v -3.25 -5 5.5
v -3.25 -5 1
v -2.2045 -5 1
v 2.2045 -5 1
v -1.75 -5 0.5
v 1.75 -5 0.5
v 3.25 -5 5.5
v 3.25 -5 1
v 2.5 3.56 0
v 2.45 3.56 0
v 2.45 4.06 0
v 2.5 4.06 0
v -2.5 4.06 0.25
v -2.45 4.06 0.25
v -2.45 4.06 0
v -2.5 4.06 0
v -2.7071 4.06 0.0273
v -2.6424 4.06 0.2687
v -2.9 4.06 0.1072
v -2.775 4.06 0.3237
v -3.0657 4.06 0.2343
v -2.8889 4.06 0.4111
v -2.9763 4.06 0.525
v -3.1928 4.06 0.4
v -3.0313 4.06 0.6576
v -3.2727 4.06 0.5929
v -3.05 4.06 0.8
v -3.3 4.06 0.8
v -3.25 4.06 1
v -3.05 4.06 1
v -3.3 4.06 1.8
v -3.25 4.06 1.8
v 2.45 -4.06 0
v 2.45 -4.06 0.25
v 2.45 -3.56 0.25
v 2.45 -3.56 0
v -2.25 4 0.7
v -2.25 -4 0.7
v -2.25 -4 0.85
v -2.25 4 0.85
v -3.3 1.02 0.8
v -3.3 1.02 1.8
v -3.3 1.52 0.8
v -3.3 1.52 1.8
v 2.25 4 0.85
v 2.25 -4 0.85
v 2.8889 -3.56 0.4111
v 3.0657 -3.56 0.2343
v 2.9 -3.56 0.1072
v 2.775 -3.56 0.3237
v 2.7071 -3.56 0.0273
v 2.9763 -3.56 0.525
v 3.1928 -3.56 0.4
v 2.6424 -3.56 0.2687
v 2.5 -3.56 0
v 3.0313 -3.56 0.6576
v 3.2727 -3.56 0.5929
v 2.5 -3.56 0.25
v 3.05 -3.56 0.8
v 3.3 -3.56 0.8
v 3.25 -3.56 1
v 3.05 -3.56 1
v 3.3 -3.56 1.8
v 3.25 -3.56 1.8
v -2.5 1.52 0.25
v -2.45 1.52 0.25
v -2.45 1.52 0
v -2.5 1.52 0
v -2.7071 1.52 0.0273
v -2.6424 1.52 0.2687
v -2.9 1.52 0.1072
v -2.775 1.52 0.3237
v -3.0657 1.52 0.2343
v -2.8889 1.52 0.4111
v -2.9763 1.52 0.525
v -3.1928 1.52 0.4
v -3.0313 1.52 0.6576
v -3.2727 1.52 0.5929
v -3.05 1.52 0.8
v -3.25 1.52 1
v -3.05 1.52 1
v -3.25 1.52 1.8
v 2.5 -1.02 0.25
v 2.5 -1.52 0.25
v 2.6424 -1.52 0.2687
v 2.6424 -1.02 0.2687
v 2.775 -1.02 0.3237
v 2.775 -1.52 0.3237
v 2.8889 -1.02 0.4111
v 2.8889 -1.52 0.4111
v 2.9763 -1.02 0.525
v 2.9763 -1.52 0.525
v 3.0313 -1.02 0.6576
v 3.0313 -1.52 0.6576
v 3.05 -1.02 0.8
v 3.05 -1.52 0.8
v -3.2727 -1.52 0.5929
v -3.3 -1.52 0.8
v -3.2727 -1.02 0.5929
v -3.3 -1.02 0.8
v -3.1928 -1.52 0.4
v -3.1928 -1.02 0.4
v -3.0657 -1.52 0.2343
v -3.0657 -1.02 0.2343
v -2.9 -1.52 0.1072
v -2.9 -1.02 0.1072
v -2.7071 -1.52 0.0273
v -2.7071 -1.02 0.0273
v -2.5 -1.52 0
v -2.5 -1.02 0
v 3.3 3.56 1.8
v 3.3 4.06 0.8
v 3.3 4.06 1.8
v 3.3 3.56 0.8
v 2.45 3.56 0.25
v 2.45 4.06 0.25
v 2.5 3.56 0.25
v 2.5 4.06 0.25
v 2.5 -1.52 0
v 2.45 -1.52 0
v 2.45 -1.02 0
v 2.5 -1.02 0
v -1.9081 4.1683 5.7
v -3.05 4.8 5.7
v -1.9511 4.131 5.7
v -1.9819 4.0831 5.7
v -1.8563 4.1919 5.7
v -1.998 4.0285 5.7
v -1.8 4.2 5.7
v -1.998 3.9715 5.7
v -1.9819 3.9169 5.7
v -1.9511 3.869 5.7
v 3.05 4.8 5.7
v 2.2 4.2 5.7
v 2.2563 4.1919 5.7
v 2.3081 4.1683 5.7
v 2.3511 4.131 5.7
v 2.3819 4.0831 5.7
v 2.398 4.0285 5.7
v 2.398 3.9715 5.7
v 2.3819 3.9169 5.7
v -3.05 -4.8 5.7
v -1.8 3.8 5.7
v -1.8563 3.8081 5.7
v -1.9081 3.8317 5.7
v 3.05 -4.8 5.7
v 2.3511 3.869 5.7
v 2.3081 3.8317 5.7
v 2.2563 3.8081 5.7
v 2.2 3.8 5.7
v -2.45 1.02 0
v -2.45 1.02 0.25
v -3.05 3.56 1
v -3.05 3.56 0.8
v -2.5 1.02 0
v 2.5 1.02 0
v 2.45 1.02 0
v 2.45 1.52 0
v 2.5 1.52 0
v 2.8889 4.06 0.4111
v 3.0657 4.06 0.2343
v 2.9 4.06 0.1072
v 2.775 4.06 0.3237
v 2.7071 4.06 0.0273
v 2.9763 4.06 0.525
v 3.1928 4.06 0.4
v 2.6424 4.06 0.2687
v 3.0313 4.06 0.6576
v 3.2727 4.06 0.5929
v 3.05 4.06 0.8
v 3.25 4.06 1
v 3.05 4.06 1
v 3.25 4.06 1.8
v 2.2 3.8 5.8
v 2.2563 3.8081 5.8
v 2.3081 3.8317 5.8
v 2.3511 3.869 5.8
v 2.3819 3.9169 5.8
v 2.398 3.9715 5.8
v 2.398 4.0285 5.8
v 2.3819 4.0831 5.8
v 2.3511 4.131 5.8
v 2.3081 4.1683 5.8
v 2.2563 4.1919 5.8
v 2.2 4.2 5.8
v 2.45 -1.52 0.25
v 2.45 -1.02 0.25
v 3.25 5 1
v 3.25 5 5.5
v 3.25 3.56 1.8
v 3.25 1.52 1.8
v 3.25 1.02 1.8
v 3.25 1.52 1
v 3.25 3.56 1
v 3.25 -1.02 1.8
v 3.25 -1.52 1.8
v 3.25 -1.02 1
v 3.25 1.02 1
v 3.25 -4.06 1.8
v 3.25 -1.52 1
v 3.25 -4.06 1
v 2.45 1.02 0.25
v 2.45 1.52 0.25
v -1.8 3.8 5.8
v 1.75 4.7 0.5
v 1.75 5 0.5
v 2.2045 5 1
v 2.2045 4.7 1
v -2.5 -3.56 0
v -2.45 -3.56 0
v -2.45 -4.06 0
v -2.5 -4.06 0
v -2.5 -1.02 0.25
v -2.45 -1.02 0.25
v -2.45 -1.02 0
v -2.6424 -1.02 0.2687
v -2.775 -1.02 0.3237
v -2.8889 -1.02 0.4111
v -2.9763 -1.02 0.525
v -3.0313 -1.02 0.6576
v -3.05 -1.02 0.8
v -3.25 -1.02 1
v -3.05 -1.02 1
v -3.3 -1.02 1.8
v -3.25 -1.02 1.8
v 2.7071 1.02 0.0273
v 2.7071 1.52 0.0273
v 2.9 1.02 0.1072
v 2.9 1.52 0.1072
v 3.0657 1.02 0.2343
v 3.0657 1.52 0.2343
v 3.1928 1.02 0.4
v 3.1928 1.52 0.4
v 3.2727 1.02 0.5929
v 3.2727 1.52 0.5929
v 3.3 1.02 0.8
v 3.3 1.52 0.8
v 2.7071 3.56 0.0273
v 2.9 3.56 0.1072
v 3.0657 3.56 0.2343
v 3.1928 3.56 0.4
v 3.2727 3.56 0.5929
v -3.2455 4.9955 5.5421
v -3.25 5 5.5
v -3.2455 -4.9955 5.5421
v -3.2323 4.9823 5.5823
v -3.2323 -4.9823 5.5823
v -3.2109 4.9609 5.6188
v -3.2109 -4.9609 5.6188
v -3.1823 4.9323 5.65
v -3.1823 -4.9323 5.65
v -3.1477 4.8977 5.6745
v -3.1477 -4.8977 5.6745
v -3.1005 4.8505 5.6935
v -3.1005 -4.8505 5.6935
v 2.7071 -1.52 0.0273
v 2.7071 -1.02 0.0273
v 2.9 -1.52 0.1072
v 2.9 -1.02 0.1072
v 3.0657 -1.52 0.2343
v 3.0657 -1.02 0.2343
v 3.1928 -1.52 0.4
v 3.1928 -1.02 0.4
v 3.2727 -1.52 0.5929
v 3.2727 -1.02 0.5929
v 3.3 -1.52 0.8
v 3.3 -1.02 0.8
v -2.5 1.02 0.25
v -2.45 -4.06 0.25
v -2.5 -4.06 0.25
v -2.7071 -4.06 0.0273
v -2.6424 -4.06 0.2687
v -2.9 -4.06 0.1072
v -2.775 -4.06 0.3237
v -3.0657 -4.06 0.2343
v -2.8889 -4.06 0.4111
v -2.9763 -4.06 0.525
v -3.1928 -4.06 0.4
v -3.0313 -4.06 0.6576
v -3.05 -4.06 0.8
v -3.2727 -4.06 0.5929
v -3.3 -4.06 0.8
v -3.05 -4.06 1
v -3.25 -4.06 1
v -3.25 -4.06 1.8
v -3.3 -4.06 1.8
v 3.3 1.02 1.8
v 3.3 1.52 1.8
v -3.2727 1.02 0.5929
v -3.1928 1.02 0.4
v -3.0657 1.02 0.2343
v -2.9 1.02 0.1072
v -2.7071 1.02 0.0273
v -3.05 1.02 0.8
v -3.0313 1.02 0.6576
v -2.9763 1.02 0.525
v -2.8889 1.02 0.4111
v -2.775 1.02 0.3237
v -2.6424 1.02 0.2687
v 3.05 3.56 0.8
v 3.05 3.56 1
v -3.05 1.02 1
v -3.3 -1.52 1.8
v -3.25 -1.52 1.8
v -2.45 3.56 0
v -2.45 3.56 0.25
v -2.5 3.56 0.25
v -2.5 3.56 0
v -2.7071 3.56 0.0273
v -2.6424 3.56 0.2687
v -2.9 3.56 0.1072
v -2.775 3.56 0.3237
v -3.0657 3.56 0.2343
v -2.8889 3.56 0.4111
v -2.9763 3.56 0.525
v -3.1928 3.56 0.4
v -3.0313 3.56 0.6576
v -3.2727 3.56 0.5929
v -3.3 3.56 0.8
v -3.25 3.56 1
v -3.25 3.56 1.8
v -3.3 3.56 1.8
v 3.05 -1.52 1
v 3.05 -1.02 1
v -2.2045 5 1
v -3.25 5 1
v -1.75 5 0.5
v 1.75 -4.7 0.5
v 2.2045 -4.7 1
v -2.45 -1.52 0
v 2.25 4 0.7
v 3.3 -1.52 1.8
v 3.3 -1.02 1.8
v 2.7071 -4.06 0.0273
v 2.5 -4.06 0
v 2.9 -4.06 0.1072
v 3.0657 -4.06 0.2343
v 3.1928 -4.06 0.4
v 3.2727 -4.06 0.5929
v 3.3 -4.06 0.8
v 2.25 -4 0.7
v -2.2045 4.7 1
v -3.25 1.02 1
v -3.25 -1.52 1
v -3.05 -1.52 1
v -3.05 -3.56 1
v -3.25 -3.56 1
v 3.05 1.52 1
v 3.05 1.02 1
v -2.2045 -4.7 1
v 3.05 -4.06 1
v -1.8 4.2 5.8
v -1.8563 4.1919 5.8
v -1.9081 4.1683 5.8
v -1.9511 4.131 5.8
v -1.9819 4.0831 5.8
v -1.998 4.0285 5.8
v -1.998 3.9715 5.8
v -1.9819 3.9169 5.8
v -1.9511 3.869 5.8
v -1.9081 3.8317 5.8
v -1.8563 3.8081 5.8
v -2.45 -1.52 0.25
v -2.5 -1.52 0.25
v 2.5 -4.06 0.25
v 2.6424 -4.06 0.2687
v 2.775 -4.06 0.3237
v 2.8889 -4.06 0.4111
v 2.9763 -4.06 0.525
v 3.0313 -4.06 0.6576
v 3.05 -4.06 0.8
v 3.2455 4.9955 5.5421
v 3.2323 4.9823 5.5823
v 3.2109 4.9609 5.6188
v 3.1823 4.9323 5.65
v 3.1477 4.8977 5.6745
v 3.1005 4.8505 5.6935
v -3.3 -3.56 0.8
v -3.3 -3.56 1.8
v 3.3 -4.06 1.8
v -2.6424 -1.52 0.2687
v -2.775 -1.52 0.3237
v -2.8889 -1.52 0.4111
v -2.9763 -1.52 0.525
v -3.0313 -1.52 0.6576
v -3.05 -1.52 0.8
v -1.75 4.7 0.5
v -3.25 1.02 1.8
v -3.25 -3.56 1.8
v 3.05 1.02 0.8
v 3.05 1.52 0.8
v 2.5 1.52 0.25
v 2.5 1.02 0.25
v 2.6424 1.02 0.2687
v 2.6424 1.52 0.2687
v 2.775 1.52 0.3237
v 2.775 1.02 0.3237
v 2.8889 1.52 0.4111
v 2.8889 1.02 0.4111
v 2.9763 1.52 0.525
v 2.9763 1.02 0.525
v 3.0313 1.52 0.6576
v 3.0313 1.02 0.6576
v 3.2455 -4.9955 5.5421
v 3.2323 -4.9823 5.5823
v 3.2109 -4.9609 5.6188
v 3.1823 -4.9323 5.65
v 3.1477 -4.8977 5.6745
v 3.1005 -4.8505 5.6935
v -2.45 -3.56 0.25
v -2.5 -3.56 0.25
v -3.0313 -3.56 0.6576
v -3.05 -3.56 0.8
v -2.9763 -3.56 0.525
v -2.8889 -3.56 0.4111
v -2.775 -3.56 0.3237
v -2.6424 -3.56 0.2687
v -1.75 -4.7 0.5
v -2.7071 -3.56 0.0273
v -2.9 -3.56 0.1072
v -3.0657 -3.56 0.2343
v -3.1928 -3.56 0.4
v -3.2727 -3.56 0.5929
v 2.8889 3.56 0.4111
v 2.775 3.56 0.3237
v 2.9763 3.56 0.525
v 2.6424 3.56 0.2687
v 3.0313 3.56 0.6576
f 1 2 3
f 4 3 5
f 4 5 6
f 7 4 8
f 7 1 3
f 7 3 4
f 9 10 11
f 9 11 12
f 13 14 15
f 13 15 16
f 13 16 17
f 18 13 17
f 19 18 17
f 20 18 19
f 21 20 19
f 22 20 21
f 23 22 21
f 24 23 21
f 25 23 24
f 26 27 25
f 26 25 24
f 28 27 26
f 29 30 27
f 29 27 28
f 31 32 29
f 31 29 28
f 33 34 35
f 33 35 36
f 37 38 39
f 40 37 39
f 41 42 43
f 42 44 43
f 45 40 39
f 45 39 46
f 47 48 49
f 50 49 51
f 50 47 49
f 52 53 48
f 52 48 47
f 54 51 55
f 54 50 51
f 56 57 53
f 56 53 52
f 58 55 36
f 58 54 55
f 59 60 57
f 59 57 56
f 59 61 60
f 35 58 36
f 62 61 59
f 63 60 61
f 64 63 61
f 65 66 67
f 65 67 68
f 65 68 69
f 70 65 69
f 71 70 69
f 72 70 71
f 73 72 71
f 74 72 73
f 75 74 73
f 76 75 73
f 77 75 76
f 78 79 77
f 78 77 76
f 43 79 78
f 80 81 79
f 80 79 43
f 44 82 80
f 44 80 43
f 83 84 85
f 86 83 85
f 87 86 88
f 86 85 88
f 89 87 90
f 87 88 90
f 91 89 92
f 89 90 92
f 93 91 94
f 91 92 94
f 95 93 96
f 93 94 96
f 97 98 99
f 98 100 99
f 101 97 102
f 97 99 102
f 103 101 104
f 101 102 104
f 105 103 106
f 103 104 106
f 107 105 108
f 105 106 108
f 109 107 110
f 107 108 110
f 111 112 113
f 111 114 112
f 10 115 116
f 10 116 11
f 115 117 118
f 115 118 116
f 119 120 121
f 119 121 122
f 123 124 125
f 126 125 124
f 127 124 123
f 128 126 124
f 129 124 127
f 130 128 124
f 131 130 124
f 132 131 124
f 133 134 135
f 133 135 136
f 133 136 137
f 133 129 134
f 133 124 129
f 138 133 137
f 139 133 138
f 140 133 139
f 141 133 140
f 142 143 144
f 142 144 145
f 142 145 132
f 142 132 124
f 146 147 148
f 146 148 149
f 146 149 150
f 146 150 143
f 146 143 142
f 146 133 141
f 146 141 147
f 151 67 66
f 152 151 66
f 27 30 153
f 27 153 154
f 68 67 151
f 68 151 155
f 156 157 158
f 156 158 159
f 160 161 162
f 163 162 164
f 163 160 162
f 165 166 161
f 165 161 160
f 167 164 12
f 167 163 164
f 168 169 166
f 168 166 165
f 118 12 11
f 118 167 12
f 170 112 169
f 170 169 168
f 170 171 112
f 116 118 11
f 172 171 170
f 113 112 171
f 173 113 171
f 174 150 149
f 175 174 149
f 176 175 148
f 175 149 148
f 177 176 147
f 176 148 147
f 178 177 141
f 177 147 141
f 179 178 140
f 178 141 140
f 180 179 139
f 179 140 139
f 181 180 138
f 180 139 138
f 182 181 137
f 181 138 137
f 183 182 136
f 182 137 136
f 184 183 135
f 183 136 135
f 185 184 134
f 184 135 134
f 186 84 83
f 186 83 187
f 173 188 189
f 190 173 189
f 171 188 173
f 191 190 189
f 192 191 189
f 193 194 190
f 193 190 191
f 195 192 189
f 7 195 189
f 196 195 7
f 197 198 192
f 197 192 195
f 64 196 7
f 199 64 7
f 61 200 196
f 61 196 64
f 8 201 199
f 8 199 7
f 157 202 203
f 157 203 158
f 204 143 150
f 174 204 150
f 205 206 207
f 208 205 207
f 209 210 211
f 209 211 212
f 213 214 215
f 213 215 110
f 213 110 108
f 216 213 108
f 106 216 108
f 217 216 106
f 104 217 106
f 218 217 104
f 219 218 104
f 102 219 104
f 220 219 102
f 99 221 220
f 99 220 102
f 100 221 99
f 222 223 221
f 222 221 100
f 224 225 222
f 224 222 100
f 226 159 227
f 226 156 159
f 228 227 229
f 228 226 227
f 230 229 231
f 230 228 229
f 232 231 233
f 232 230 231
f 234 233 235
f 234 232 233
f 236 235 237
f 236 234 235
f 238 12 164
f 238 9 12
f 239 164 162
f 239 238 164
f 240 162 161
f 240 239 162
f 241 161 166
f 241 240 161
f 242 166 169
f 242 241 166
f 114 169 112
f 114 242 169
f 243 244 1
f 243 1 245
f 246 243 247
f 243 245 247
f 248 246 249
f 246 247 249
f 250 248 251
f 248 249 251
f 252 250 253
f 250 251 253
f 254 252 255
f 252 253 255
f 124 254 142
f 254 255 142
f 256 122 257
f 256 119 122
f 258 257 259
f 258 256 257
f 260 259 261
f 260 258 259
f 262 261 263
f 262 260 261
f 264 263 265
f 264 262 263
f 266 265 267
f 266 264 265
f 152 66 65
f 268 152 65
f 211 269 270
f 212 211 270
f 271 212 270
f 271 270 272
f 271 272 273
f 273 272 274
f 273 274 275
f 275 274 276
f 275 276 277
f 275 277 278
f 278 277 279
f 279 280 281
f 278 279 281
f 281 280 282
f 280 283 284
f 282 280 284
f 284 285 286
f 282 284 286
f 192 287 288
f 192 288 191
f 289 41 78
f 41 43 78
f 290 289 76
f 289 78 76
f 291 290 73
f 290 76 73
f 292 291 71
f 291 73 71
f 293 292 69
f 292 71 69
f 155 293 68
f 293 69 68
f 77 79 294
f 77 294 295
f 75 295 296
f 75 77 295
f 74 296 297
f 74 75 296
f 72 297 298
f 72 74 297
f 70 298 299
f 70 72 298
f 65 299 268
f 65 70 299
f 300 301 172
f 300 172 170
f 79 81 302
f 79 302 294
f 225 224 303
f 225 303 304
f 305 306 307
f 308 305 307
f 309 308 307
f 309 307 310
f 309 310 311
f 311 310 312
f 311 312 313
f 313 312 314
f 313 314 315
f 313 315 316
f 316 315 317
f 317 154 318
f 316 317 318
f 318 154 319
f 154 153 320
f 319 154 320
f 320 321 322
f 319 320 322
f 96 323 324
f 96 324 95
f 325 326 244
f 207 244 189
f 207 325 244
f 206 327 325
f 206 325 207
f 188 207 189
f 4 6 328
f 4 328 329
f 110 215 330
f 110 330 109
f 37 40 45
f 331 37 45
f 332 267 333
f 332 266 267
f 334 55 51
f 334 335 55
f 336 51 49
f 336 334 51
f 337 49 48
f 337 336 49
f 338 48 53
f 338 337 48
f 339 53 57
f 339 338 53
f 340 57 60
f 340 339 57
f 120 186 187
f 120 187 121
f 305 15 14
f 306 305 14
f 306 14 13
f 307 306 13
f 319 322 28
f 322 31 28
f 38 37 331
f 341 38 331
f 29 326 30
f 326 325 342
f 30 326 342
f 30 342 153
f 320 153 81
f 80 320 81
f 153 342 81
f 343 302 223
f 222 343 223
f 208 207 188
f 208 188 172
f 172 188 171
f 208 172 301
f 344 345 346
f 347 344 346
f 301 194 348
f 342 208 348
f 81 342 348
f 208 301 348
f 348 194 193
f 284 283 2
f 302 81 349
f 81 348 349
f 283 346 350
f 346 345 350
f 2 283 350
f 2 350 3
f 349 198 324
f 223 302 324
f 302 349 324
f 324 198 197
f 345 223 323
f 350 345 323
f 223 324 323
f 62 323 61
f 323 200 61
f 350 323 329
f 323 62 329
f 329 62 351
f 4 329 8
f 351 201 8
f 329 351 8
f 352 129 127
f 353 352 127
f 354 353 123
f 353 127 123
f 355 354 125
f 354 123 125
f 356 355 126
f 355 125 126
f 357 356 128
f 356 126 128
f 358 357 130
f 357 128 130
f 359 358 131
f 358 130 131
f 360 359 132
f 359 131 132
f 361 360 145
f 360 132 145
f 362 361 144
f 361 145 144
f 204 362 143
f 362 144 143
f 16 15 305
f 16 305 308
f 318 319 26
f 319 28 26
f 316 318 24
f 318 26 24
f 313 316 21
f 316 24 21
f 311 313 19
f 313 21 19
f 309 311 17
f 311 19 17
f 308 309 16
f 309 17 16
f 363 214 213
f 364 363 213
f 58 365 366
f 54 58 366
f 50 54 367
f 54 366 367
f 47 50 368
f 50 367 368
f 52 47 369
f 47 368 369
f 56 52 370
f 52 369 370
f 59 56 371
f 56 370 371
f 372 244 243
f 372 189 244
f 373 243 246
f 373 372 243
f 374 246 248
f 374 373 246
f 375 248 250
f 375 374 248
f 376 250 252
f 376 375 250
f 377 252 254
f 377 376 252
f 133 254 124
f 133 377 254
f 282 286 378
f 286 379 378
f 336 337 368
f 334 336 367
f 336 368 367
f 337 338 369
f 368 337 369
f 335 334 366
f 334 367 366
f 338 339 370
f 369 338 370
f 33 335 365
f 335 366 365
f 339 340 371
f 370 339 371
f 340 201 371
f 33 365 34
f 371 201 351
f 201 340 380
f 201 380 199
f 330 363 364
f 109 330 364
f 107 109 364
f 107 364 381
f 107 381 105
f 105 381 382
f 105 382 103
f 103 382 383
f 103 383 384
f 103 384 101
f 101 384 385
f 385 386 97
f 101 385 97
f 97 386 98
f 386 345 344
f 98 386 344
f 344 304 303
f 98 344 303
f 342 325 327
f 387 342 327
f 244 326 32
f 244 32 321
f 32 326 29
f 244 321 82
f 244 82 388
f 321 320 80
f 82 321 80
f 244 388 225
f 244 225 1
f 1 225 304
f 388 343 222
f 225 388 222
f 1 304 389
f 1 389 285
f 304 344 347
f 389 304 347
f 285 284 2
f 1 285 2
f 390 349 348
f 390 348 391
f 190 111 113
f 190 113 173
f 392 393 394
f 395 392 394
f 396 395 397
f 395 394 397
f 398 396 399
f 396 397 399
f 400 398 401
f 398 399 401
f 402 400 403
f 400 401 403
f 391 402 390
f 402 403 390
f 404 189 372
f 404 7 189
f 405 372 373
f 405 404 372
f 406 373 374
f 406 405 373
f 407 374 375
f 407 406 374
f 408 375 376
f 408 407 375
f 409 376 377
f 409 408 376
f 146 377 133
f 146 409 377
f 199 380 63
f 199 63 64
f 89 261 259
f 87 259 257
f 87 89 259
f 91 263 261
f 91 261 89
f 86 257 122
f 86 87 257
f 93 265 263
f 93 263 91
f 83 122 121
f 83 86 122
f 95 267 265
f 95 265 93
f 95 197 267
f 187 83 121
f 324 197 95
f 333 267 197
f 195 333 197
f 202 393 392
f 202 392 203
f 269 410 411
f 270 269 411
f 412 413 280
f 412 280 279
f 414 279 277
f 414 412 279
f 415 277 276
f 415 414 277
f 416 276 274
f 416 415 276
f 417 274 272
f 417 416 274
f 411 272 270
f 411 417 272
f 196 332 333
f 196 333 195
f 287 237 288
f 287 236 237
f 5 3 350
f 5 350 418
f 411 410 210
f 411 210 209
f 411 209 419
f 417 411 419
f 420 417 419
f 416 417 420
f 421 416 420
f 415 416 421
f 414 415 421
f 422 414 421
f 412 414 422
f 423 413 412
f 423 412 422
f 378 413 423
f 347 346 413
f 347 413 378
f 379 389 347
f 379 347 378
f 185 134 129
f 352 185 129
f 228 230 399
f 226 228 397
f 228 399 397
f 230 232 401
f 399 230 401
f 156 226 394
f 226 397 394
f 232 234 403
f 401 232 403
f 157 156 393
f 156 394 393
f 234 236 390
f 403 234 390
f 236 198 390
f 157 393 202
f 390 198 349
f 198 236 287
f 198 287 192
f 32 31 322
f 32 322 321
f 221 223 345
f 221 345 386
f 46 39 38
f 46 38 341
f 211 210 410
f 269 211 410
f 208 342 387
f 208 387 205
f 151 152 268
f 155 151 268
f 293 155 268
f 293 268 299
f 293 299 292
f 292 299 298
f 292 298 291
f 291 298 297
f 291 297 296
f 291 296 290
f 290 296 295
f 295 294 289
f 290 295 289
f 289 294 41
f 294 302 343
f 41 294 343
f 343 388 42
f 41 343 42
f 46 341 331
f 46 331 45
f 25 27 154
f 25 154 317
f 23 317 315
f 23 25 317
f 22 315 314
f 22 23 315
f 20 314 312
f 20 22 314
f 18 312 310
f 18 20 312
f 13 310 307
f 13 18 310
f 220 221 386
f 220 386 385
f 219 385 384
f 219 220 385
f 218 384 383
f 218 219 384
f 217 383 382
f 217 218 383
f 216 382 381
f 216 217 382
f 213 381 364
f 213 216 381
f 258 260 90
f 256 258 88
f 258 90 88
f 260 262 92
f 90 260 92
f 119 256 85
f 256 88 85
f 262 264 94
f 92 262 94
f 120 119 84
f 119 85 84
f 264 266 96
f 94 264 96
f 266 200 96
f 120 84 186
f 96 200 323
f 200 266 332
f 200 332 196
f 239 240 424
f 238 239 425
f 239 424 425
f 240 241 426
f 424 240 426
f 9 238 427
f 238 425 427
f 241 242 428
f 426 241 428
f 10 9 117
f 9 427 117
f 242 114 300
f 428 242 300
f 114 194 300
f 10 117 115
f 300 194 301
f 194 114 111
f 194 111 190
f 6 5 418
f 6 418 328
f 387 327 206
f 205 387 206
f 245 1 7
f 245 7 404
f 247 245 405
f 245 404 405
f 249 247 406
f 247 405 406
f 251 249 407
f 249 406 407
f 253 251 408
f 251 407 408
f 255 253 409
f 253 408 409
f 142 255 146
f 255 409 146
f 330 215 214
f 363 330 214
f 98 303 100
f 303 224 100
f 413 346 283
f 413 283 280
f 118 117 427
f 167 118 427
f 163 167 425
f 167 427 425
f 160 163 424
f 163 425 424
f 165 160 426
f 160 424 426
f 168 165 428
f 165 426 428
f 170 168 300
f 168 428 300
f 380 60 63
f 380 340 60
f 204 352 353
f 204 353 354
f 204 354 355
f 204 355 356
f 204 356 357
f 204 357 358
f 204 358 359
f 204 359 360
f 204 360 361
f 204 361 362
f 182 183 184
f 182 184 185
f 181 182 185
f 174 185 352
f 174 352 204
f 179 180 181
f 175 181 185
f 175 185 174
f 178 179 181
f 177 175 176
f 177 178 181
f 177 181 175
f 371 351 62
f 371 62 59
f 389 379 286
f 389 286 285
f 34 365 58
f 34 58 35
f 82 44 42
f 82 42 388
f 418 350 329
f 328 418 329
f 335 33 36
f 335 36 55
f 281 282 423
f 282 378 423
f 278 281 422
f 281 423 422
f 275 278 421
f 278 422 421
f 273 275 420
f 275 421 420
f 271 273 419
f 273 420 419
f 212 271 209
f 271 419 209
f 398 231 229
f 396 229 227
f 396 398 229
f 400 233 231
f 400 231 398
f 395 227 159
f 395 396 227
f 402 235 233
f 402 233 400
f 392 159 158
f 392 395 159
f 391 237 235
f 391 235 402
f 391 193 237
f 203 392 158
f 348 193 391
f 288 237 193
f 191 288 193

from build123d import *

# Parameters (mm, degrees)
SKETCH_W     = 10
SKETCH_H     = 6.5
PAD_DEPTH    = 4.7
FILLET_R     = 0.2
PAD010_DEPTH = 0.25
PAD012_DEPTH = 0.25
PAD007_DEPTH = 0.3
SKETCH008_W  = 4.5
SKETCH008_H  = 0.15
PAD006_DEPTH = 4
PAD013_DEPTH = 0.25
PAD011_DEPTH = 0.25
PAD014_DEPTH = 0.2
PAD008_DEPTH = 0.3


with BuildPart() as fillet_body:
    # Sketch → Pad (new body)
    with BuildSketch(Plane(origin=(0, 0, 1), x_dir=(0, -1, 0), z_dir=(0, 0, 1))):
        Rectangle(SKETCH_W, SKETCH_H)
    extrude(amount=PAD_DEPTH)

    # Fillet
    fillet_edges = [fillet_body.edges().sort_by_distance(p)[0] for p in [
        (-3.25, 0, 5.7),
        (0, -5, 5.7),
        (3.25, 0, 5.7),
        (0, 5, 5.7),
    ]]
    fillet(fillet_edges, radius=FILLET_R)


with BuildPart() as pad010:
    # Sketch011 → Pad010 (new body, symmetric)
    with BuildSketch(Plane.XZ.offset(1.27)):
        with BuildLine():
            Line((-3.3, 1.8), (-3.05, 1.8))
            Line((-3.05, 1.8), (-3.05, 0.8))
            ThreePointArc((-3.05, 0.8), (-2.888909, 0.411091), (-2.5, 0.25))
            Line((-2.45, 0.25), (-2.5, 0.25))
            Line((-2.45, 0), (-2.45, 0.25))
            Line((-2.45, 0), (-2.5, 0))
            ThreePointArc((-3.3, 0.8), (-3.065685, 0.234315), (-2.5, 0))
            Line((-3.3, 1.8), (-3.3, 0.8))
        make_face()
        with BuildLine():
            ThreePointArc((2.5, 0.25), (2.888909, 0.411091), (3.05, 0.8))
            Line((3.05, 1.8), (3.05, 0.8))
            Line((3.3, 1.8), (3.05, 1.8))
            Line((3.3, 0.8), (3.3, 1.8))
            ThreePointArc((2.500011, 0), (3.065689, 0.234318), (3.3, 0.8))
            Line((2.45, 0), (2.500011, 0))
            Line((2.45, 0.25), (2.45, 0))
            Line((2.5, 0.25), (2.45, 0.25))
        make_face()
    extrude(amount=PAD010_DEPTH, both=True)


with BuildPart() as pad012:
    # Sketch013 → Pad012 (new body, symmetric)
    with BuildSketch(Plane.XZ.offset(-3.81)):
        with BuildLine():
            Line((-3.3, 1.8), (-3.05, 1.8))
            Line((-3.05, 1.8), (-3.05, 0.8))
            ThreePointArc((-3.05, 0.8), (-2.888909, 0.411091), (-2.5, 0.25))
            Line((-2.45, 0.25), (-2.5, 0.25))
            Line((-2.45, 0), (-2.45, 0.25))
            Line((-2.45, 0), (-2.5, 0))
            ThreePointArc((-3.3, 0.8), (-3.065685, 0.234315), (-2.5, 0))
            Line((-3.3, 1.8), (-3.3, 0.8))
        make_face()
        with BuildLine():
            ThreePointArc((2.5, 0.25), (2.888909, 0.411091), (3.05, 0.8))
            Line((3.05, 1.8), (3.05, 0.8))
            Line((3.3, 1.8), (3.05, 1.8))
            Line((3.3, 0.8), (3.3, 1.8))
            ThreePointArc((2.500011, 0), (3.065689, 0.234318), (3.3, 0.8))
            Line((2.45, 0), (2.500011, 0))
            Line((2.45, 0.25), (2.45, 0))
            Line((2.5, 0.25), (2.45, 0.25))
        make_face()
    extrude(amount=PAD012_DEPTH, both=True)


with BuildPart() as pad007:
    # Sketch009 → Pad007 (new body)
    with BuildSketch(Plane.XZ.offset(5)):
        Polygon((-1.75, 0.5), (1.75, 0.5), (2.25, 1.05), (-2.25, 1.05), align=None)
    extrude(amount=-PAD007_DEPTH)


with BuildPart() as pad006:
    # Sketch008 → Pad006 (new body, symmetric)
    with BuildSketch(Plane.XZ):
        with Locations((0, 0.775)):
            Rectangle(SKETCH008_W, SKETCH008_H)
    extrude(amount=PAD006_DEPTH, both=True)


with BuildPart() as pad013:
    # Sketch014 → Pad013 (new body, symmetric)
    with BuildSketch(Plane.XZ.offset(3.81)):
        with BuildLine():
            Line((-3.3, 1.8), (-3.05, 1.8))
            Line((-3.05, 1.8), (-3.05, 0.8))
            ThreePointArc((-3.05, 0.8), (-2.888909, 0.411091), (-2.5, 0.25))
            Line((-2.45, 0.25), (-2.5, 0.25))
            Line((-2.45, 0), (-2.45, 0.25))
            Line((-2.45, 0), (-2.5, 0))
            ThreePointArc((-3.3, 0.8), (-3.065685, 0.234315), (-2.5, 0))
            Line((-3.3, 1.8), (-3.3, 0.8))
        make_face()
        with BuildLine():
            ThreePointArc((2.5, 0.25), (2.888909, 0.411091), (3.05, 0.8))
            Line((3.05, 1.8), (3.05, 0.8))
            Line((3.3, 1.8), (3.05, 1.8))
            Line((3.3, 0.8), (3.3, 1.8))
            ThreePointArc((2.500011, 0), (3.065689, 0.234318), (3.3, 0.8))
            Line((2.45, 0), (2.500011, 0))
            Line((2.45, 0.25), (2.45, 0))
            Line((2.5, 0.25), (2.45, 0.25))
        make_face()
    extrude(amount=PAD013_DEPTH, both=True)


with BuildPart() as pad011:
    # Sketch012 → Pad011 (new body, symmetric)
    with BuildSketch(Plane.XZ.offset(-1.27)):
        with BuildLine():
            Line((-3.3, 1.8), (-3.05, 1.8))
            Line((-3.05, 1.8), (-3.05, 0.8))
            ThreePointArc((-3.05, 0.8), (-2.888909, 0.411091), (-2.5, 0.25))
            Line((-2.45, 0.25), (-2.5, 0.25))
            Line((-2.45, 0), (-2.45, 0.25))
            Line((-2.45, 0), (-2.5, 0))
            ThreePointArc((-3.3, 0.8), (-3.065685, 0.234315), (-2.5, 0))
            Line((-3.3, 1.8), (-3.3, 0.8))
        make_face()
        with BuildLine():
            ThreePointArc((2.5, 0.25), (2.888909, 0.411091), (3.05, 0.8))
            Line((3.05, 1.8), (3.05, 0.8))
            Line((3.3, 1.8), (3.05, 1.8))
            Line((3.3, 0.8), (3.3, 1.8))
            ThreePointArc((2.500011, 0), (3.065689, 0.234318), (3.3, 0.8))
            Line((2.45, 0), (2.500011, 0))
            Line((2.45, 0.25), (2.45, 0))
            Line((2.5, 0.25), (2.45, 0.25))
        make_face()
    extrude(amount=PAD011_DEPTH, both=True)


with BuildPart() as pad014:
    # Sketch001 → Pad014 (new body)
    with BuildSketch(Plane(origin=(0, 0, 5.6), x_dir=(0, -1, 0), z_dir=(0, 0, 1))):
        with BuildLine():
            Line((-3.8, -1.8), (-3.8, 2.2))
            ThreePointArc((-3.8, 2.2), (-4, 2.4), (-4.2, 2.2))
            Line((-4.2, 2.2), (-4.2, -1.8))
            ThreePointArc((-4.2, -1.8), (-4, -2), (-3.8, -1.8))
        make_face()
    extrude(amount=PAD014_DEPTH)


with BuildPart() as relay_dpdt_omron_g6k_2g:
    # Sketch010 → Pad008 (new body)
    with BuildSketch(Plane.XZ.offset(-5)):
        Polygon((-1.75, 0.5), (1.75, 0.5), (2.25, 1.05), (-2.25, 1.05), align=None)
    extrude(amount=PAD008_DEPTH)

    # Pad008_mp_cp: union Fillet body, Pad010, Pad012, Pad007, Pad006, Pad013, Pad011, Pad014
    add(fillet_body.part)
    add(pad010.part)
    add(pad012.part)
    add(pad007.part)
    add(pad006.part)
    add(pad013.part)
    add(pad011.part)
    add(pad014.part)


solid = relay_dpdt_omron_g6k_2g.part
